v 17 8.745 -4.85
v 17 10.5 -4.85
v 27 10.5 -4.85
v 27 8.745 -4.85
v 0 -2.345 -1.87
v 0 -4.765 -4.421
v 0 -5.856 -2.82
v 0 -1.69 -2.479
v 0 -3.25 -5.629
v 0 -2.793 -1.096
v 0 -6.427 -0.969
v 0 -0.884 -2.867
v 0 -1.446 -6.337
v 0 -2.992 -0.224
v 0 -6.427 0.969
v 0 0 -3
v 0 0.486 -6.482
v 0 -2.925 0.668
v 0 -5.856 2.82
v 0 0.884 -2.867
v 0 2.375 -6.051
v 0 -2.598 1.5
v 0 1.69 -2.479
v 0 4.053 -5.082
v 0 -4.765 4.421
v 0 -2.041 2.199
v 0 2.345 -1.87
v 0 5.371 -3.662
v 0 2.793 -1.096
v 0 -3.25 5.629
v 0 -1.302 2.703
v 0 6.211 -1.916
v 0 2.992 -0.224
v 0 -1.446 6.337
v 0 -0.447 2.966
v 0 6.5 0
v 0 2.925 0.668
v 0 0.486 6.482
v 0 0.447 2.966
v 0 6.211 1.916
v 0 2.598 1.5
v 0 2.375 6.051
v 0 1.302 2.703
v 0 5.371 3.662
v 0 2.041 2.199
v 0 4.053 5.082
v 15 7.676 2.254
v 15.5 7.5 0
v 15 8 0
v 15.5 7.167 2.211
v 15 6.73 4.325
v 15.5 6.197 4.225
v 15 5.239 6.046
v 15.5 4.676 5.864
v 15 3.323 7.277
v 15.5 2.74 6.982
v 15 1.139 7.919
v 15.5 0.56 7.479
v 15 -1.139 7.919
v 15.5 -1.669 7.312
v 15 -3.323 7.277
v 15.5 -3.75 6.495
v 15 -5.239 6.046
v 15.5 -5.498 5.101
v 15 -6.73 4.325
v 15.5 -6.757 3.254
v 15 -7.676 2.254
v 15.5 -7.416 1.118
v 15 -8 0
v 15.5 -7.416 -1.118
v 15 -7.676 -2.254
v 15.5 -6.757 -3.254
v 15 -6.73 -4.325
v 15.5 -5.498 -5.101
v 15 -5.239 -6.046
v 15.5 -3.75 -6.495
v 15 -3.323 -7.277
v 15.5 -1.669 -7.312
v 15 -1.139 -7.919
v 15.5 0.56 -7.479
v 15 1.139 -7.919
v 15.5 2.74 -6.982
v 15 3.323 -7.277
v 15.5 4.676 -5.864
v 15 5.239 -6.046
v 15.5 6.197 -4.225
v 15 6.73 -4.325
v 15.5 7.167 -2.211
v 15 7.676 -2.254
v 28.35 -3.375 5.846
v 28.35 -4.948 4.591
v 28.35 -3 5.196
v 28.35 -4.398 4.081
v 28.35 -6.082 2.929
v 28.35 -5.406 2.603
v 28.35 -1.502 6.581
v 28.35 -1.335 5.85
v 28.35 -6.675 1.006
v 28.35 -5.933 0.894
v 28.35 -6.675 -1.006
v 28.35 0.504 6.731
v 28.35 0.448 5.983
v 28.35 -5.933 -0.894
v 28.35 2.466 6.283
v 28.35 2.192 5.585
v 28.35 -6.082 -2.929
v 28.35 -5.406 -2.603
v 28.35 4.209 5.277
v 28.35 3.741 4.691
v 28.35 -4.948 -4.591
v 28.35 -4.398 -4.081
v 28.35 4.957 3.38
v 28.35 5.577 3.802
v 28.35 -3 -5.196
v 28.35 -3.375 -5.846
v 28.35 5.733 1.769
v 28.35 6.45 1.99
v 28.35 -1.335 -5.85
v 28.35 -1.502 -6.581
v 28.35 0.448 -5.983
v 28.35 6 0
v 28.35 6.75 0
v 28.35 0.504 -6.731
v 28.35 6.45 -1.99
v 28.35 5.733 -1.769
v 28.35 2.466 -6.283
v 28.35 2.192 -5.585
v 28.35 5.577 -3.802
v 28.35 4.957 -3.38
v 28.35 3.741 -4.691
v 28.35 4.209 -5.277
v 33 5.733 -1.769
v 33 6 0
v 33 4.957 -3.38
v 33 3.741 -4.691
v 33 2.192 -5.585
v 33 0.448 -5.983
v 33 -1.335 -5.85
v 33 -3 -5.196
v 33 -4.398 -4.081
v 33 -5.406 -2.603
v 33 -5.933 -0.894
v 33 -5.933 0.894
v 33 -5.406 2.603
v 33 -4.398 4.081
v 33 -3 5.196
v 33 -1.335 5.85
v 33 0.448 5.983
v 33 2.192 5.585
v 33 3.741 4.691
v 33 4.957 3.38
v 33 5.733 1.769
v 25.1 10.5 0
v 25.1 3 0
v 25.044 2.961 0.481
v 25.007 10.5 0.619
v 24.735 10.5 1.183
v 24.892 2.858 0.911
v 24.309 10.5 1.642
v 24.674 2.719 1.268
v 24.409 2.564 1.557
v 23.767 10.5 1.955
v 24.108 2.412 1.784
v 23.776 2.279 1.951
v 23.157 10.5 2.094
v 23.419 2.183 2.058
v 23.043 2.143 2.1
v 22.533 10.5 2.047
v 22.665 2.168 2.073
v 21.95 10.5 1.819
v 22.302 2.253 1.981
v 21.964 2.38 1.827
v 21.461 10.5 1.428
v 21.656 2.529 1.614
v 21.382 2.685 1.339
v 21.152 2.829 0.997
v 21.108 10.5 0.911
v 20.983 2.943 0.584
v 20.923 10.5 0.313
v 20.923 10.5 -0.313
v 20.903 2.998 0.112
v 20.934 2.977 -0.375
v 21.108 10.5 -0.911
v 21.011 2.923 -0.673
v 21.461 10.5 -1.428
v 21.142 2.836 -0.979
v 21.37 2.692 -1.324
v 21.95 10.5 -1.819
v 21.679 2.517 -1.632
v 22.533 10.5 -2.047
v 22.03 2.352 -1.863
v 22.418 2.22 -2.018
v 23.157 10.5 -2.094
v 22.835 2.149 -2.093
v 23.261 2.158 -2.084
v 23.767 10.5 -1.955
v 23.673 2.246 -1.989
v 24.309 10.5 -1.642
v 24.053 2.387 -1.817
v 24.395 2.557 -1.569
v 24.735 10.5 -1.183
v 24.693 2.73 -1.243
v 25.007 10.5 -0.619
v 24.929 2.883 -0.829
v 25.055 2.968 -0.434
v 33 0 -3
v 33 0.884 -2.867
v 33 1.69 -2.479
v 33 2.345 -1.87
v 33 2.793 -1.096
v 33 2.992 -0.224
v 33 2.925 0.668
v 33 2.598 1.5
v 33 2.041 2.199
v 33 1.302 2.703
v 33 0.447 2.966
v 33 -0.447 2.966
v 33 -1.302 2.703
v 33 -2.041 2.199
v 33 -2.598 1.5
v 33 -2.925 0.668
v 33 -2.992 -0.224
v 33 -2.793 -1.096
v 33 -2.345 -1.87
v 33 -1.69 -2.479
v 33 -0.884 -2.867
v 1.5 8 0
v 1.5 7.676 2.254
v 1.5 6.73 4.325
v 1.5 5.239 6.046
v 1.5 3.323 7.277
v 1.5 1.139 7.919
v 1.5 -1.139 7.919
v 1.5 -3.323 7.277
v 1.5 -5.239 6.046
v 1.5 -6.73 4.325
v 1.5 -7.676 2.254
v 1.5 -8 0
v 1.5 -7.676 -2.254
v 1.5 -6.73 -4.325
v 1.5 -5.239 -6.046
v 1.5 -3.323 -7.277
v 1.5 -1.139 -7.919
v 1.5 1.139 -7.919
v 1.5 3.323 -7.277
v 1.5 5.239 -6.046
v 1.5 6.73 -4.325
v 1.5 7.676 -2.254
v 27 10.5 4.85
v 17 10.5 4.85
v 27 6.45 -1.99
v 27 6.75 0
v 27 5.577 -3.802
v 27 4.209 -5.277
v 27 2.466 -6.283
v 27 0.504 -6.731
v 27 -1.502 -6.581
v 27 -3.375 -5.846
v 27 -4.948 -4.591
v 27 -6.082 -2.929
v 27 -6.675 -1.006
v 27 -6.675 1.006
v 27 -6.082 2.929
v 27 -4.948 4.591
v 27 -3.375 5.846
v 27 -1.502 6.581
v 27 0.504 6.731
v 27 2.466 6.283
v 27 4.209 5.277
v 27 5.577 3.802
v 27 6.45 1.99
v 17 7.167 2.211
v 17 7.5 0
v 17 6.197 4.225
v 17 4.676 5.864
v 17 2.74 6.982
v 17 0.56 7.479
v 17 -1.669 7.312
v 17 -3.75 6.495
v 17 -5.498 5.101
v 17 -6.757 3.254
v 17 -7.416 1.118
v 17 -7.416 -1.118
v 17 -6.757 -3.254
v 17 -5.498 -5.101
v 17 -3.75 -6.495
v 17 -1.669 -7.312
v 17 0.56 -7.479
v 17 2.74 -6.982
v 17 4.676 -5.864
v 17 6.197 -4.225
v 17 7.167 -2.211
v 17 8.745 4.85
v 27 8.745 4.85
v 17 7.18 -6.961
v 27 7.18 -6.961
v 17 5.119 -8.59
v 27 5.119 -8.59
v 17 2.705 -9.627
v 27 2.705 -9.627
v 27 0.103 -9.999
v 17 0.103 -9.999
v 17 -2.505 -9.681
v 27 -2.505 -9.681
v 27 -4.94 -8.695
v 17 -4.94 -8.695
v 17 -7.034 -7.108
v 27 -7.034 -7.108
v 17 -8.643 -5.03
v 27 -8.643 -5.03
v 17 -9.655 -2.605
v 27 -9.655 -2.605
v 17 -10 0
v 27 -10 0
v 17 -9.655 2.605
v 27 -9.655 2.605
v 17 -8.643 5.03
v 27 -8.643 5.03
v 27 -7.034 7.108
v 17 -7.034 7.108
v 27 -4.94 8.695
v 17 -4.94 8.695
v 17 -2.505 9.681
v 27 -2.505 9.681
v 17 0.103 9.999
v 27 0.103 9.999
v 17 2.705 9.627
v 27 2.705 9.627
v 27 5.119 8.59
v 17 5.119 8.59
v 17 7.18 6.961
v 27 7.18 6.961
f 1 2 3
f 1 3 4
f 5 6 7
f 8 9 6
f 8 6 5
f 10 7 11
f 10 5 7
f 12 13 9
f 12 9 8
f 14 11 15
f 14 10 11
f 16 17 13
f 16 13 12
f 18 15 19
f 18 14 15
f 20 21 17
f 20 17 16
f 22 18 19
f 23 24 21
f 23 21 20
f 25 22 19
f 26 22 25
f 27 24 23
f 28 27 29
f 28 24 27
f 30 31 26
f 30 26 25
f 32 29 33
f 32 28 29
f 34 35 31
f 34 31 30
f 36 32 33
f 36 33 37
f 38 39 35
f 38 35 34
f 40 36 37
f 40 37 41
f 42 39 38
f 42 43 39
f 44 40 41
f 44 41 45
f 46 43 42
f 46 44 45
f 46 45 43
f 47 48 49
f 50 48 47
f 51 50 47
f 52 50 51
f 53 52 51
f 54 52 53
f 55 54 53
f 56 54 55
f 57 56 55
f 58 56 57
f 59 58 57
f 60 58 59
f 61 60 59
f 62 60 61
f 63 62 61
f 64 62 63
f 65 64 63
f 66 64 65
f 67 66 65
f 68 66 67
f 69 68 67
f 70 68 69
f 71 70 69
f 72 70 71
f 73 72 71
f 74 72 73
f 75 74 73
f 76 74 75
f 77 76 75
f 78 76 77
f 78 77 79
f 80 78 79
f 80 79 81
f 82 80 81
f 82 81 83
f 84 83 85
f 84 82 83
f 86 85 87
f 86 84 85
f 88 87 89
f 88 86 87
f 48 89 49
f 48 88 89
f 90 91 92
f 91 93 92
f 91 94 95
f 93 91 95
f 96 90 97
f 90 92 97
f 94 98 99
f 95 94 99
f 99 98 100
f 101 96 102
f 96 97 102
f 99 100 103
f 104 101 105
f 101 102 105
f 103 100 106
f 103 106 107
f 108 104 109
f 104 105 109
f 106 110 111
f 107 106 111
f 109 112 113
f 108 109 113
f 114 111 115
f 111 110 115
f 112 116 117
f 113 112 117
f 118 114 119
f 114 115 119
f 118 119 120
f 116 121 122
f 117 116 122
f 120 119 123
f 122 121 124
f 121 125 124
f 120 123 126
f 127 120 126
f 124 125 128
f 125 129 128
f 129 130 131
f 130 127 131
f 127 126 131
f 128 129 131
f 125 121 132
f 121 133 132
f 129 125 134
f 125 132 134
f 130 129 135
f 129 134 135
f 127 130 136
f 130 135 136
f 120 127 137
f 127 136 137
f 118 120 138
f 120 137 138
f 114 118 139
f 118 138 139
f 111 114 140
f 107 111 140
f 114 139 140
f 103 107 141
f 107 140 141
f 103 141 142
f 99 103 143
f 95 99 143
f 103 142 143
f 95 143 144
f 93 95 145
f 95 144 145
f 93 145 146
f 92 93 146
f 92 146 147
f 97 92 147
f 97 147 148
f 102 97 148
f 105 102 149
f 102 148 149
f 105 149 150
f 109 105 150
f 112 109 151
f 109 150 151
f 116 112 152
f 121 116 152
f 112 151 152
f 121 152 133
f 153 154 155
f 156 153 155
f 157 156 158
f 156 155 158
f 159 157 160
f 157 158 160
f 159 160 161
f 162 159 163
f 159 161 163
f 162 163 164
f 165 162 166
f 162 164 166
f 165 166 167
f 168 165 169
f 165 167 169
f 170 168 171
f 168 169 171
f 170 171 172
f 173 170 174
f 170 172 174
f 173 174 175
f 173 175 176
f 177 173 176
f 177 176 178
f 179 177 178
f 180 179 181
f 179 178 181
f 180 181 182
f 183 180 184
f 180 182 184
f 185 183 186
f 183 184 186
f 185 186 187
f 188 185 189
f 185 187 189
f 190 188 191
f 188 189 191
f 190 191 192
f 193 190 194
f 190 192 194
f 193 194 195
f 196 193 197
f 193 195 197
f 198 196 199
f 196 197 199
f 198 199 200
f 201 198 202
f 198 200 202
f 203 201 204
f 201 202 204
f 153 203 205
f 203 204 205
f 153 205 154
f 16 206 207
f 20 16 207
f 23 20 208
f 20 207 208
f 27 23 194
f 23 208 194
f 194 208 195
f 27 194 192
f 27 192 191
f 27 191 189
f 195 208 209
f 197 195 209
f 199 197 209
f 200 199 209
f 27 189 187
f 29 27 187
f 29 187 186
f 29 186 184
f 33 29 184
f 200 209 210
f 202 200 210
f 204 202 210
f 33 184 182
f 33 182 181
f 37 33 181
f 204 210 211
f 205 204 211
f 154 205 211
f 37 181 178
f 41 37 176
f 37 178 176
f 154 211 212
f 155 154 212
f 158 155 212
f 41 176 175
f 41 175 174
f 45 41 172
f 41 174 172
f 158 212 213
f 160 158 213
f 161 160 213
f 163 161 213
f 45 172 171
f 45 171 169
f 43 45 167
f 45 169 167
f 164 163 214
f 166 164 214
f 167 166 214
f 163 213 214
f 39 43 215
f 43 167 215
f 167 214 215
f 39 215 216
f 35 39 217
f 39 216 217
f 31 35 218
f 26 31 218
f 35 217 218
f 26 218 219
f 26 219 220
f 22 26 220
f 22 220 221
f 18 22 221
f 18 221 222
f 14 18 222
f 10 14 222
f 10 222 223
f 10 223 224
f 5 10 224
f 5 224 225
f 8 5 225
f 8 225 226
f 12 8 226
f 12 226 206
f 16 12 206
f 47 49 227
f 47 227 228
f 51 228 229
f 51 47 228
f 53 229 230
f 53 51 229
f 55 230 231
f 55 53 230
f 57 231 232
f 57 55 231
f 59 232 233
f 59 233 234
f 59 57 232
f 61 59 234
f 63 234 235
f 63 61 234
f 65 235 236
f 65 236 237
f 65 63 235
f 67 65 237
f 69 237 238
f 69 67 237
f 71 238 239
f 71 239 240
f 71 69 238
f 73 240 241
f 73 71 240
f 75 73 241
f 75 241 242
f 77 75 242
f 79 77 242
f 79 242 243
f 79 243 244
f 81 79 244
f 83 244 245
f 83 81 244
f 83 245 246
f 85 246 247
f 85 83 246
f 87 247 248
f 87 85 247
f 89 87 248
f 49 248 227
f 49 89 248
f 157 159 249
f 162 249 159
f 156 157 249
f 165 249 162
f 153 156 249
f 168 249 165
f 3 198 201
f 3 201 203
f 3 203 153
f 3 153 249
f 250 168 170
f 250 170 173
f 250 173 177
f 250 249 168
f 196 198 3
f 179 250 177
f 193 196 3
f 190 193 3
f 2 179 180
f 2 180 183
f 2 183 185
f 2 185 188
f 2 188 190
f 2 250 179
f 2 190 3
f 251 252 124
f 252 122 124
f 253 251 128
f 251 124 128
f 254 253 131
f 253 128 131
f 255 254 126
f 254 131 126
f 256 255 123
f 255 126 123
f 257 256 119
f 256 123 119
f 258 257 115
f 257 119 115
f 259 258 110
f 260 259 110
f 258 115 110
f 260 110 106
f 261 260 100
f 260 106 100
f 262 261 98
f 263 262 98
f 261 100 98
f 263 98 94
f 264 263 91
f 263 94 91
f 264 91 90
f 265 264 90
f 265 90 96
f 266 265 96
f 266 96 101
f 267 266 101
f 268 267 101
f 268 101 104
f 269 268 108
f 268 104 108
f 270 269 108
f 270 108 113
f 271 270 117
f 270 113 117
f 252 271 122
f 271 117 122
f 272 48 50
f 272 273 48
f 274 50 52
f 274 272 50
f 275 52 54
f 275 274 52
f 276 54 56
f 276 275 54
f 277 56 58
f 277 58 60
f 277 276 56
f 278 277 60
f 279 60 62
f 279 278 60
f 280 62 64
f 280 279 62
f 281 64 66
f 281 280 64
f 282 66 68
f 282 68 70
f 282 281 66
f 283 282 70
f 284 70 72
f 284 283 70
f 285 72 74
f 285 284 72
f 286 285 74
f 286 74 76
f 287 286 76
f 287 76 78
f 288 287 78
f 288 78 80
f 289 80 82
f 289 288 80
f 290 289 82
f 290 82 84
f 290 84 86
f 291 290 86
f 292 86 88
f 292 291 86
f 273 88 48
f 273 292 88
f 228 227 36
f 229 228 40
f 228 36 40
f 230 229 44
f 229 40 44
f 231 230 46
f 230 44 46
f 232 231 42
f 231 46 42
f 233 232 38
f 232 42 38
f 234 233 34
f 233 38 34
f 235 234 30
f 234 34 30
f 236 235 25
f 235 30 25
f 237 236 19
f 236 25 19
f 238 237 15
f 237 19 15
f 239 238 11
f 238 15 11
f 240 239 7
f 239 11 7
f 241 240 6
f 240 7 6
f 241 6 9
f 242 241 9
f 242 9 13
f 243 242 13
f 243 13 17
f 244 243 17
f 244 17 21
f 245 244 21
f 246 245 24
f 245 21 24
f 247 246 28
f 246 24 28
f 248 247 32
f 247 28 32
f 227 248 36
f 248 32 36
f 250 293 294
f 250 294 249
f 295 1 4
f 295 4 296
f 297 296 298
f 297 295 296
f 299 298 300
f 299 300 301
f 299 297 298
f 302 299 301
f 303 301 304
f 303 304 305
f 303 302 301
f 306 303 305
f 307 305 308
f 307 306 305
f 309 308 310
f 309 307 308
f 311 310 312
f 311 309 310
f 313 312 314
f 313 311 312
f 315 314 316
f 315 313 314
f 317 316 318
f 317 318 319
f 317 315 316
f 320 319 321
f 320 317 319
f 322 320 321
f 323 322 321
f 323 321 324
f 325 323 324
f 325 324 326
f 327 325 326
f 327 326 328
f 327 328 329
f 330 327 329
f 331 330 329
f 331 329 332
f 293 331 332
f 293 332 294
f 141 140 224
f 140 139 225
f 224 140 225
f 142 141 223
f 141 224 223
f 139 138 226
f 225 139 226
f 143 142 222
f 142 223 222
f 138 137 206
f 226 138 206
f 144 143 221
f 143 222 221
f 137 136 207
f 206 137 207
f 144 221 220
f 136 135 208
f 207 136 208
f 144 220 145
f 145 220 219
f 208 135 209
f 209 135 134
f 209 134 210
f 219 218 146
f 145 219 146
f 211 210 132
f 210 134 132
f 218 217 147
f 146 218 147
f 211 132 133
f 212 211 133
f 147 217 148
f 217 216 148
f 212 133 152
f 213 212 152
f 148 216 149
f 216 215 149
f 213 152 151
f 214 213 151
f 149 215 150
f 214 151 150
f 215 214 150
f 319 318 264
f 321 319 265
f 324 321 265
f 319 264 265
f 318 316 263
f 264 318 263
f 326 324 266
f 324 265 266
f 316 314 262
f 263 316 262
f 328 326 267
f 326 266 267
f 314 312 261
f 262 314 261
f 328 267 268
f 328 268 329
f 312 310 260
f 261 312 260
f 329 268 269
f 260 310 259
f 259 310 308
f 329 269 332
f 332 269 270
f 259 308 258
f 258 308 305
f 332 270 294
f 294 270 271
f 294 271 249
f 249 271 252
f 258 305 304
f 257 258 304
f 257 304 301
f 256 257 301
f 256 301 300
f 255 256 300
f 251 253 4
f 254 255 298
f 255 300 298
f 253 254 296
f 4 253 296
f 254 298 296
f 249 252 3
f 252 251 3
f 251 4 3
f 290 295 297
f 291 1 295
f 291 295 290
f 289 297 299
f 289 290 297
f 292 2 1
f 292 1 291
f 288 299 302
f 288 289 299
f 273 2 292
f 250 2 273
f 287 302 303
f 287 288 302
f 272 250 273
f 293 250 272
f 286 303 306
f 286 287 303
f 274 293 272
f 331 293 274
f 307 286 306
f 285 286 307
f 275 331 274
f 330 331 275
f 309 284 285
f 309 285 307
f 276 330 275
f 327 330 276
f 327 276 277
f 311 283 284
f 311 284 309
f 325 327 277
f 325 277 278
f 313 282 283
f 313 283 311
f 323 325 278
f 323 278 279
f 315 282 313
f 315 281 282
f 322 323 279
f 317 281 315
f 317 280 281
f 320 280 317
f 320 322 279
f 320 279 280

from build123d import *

# Parameters (mm, degrees)
BOSS_EXTRUDE1_DEPTH     = 33
CHAMFER1_SIZE           = 1.5
G1_8_TAPPED_HOLE1_D     = 4.2
G1_8_TAPPED_HOLE1_DEPTH = 11
G1_8_TAPPED_HOLE1_TIP   = 1.2618073
SKETCH6_R               = 3
CUT_EXTRUDE1_DEPTH      = 34


with BuildPart() as part:
    # Sketch1 → Boss-Extrude1 (new body)
    with BuildSketch(Plane(origin=(0, 0, 0), x_dir=(0, 0, -1), z_dir=(1, 0, 0))):
        with BuildLine():
            Line((-4.85, 8.745141508), (-4.85, 10.5))
            Line((-4.85, 10.5), (4.85, 10.5))
            Line((4.85, 10.5), (4.85, 8.745141508))
            ThreePointArc((4.85, 8.745141508), (0, -10), (-4.85, 8.745141508))
        make_face()
    extrude(amount=BOSS_EXTRUDE1_DEPTH)

    # Sketch2 → Cut-Revolve1 (revolve, cut)
    with BuildSketch(Plane.XY):
        Polygon((27, 14), (27, 6.75), (28.35, 6.75), (28.35, 6), (33, 6), (33, 14), align=None)
    revolve(axis=Axis((45.5, 0, 0), (-1, 0, 0)), mode=Mode.SUBTRACT)

    # Sketch3 → Cut-Revolve2 (revolve, cut)
    with BuildSketch(Plane.XY):
        Polygon((0, 8), (15, 8), (15.5, 7.5), (17, 7.5), (17, 16), (0, 16), align=None)
    revolve(axis=Axis((0, 0, 0), (1, 0, 0)), mode=Mode.SUBTRACT)

    # Chamfer1
    chamfer1_edges = [part.edges().sort_by_distance(p)[0] for p in [
        (0, -8, 0),
    ]]
    chamfer(chamfer1_edges, length=CHAMFER1_SIZE)

    # G1/8 Tapped Hole1
    with Locations(Plane(origin=(0, 10.5, 0), x_dir=(-1, 0, 0), z_dir=(0, 1, 0))):
        with Locations((-23, 0)):
            Hole(G1_8_TAPPED_HOLE1_D / 2, depth=G1_8_TAPPED_HOLE1_DEPTH)
            with Locations((0, 0, -(G1_8_TAPPED_HOLE1_DEPTH + G1_8_TAPPED_HOLE1_TIP / 2))):  # 118° drill point
                Cone(0, G1_8_TAPPED_HOLE1_D / 2, G1_8_TAPPED_HOLE1_TIP, mode=Mode.SUBTRACT)

    # Sketch6 → Cut-Extrude1 (cut, through all)
    with BuildSketch(Plane(origin=(33, 0, 0), x_dir=(0, 0, -1), z_dir=(1, 0, 0))):
        Circle(SKETCH6_R)
    extrude(amount=-CUT_EXTRUDE1_DEPTH, mode=Mode.SUBTRACT)


solid = part.part
